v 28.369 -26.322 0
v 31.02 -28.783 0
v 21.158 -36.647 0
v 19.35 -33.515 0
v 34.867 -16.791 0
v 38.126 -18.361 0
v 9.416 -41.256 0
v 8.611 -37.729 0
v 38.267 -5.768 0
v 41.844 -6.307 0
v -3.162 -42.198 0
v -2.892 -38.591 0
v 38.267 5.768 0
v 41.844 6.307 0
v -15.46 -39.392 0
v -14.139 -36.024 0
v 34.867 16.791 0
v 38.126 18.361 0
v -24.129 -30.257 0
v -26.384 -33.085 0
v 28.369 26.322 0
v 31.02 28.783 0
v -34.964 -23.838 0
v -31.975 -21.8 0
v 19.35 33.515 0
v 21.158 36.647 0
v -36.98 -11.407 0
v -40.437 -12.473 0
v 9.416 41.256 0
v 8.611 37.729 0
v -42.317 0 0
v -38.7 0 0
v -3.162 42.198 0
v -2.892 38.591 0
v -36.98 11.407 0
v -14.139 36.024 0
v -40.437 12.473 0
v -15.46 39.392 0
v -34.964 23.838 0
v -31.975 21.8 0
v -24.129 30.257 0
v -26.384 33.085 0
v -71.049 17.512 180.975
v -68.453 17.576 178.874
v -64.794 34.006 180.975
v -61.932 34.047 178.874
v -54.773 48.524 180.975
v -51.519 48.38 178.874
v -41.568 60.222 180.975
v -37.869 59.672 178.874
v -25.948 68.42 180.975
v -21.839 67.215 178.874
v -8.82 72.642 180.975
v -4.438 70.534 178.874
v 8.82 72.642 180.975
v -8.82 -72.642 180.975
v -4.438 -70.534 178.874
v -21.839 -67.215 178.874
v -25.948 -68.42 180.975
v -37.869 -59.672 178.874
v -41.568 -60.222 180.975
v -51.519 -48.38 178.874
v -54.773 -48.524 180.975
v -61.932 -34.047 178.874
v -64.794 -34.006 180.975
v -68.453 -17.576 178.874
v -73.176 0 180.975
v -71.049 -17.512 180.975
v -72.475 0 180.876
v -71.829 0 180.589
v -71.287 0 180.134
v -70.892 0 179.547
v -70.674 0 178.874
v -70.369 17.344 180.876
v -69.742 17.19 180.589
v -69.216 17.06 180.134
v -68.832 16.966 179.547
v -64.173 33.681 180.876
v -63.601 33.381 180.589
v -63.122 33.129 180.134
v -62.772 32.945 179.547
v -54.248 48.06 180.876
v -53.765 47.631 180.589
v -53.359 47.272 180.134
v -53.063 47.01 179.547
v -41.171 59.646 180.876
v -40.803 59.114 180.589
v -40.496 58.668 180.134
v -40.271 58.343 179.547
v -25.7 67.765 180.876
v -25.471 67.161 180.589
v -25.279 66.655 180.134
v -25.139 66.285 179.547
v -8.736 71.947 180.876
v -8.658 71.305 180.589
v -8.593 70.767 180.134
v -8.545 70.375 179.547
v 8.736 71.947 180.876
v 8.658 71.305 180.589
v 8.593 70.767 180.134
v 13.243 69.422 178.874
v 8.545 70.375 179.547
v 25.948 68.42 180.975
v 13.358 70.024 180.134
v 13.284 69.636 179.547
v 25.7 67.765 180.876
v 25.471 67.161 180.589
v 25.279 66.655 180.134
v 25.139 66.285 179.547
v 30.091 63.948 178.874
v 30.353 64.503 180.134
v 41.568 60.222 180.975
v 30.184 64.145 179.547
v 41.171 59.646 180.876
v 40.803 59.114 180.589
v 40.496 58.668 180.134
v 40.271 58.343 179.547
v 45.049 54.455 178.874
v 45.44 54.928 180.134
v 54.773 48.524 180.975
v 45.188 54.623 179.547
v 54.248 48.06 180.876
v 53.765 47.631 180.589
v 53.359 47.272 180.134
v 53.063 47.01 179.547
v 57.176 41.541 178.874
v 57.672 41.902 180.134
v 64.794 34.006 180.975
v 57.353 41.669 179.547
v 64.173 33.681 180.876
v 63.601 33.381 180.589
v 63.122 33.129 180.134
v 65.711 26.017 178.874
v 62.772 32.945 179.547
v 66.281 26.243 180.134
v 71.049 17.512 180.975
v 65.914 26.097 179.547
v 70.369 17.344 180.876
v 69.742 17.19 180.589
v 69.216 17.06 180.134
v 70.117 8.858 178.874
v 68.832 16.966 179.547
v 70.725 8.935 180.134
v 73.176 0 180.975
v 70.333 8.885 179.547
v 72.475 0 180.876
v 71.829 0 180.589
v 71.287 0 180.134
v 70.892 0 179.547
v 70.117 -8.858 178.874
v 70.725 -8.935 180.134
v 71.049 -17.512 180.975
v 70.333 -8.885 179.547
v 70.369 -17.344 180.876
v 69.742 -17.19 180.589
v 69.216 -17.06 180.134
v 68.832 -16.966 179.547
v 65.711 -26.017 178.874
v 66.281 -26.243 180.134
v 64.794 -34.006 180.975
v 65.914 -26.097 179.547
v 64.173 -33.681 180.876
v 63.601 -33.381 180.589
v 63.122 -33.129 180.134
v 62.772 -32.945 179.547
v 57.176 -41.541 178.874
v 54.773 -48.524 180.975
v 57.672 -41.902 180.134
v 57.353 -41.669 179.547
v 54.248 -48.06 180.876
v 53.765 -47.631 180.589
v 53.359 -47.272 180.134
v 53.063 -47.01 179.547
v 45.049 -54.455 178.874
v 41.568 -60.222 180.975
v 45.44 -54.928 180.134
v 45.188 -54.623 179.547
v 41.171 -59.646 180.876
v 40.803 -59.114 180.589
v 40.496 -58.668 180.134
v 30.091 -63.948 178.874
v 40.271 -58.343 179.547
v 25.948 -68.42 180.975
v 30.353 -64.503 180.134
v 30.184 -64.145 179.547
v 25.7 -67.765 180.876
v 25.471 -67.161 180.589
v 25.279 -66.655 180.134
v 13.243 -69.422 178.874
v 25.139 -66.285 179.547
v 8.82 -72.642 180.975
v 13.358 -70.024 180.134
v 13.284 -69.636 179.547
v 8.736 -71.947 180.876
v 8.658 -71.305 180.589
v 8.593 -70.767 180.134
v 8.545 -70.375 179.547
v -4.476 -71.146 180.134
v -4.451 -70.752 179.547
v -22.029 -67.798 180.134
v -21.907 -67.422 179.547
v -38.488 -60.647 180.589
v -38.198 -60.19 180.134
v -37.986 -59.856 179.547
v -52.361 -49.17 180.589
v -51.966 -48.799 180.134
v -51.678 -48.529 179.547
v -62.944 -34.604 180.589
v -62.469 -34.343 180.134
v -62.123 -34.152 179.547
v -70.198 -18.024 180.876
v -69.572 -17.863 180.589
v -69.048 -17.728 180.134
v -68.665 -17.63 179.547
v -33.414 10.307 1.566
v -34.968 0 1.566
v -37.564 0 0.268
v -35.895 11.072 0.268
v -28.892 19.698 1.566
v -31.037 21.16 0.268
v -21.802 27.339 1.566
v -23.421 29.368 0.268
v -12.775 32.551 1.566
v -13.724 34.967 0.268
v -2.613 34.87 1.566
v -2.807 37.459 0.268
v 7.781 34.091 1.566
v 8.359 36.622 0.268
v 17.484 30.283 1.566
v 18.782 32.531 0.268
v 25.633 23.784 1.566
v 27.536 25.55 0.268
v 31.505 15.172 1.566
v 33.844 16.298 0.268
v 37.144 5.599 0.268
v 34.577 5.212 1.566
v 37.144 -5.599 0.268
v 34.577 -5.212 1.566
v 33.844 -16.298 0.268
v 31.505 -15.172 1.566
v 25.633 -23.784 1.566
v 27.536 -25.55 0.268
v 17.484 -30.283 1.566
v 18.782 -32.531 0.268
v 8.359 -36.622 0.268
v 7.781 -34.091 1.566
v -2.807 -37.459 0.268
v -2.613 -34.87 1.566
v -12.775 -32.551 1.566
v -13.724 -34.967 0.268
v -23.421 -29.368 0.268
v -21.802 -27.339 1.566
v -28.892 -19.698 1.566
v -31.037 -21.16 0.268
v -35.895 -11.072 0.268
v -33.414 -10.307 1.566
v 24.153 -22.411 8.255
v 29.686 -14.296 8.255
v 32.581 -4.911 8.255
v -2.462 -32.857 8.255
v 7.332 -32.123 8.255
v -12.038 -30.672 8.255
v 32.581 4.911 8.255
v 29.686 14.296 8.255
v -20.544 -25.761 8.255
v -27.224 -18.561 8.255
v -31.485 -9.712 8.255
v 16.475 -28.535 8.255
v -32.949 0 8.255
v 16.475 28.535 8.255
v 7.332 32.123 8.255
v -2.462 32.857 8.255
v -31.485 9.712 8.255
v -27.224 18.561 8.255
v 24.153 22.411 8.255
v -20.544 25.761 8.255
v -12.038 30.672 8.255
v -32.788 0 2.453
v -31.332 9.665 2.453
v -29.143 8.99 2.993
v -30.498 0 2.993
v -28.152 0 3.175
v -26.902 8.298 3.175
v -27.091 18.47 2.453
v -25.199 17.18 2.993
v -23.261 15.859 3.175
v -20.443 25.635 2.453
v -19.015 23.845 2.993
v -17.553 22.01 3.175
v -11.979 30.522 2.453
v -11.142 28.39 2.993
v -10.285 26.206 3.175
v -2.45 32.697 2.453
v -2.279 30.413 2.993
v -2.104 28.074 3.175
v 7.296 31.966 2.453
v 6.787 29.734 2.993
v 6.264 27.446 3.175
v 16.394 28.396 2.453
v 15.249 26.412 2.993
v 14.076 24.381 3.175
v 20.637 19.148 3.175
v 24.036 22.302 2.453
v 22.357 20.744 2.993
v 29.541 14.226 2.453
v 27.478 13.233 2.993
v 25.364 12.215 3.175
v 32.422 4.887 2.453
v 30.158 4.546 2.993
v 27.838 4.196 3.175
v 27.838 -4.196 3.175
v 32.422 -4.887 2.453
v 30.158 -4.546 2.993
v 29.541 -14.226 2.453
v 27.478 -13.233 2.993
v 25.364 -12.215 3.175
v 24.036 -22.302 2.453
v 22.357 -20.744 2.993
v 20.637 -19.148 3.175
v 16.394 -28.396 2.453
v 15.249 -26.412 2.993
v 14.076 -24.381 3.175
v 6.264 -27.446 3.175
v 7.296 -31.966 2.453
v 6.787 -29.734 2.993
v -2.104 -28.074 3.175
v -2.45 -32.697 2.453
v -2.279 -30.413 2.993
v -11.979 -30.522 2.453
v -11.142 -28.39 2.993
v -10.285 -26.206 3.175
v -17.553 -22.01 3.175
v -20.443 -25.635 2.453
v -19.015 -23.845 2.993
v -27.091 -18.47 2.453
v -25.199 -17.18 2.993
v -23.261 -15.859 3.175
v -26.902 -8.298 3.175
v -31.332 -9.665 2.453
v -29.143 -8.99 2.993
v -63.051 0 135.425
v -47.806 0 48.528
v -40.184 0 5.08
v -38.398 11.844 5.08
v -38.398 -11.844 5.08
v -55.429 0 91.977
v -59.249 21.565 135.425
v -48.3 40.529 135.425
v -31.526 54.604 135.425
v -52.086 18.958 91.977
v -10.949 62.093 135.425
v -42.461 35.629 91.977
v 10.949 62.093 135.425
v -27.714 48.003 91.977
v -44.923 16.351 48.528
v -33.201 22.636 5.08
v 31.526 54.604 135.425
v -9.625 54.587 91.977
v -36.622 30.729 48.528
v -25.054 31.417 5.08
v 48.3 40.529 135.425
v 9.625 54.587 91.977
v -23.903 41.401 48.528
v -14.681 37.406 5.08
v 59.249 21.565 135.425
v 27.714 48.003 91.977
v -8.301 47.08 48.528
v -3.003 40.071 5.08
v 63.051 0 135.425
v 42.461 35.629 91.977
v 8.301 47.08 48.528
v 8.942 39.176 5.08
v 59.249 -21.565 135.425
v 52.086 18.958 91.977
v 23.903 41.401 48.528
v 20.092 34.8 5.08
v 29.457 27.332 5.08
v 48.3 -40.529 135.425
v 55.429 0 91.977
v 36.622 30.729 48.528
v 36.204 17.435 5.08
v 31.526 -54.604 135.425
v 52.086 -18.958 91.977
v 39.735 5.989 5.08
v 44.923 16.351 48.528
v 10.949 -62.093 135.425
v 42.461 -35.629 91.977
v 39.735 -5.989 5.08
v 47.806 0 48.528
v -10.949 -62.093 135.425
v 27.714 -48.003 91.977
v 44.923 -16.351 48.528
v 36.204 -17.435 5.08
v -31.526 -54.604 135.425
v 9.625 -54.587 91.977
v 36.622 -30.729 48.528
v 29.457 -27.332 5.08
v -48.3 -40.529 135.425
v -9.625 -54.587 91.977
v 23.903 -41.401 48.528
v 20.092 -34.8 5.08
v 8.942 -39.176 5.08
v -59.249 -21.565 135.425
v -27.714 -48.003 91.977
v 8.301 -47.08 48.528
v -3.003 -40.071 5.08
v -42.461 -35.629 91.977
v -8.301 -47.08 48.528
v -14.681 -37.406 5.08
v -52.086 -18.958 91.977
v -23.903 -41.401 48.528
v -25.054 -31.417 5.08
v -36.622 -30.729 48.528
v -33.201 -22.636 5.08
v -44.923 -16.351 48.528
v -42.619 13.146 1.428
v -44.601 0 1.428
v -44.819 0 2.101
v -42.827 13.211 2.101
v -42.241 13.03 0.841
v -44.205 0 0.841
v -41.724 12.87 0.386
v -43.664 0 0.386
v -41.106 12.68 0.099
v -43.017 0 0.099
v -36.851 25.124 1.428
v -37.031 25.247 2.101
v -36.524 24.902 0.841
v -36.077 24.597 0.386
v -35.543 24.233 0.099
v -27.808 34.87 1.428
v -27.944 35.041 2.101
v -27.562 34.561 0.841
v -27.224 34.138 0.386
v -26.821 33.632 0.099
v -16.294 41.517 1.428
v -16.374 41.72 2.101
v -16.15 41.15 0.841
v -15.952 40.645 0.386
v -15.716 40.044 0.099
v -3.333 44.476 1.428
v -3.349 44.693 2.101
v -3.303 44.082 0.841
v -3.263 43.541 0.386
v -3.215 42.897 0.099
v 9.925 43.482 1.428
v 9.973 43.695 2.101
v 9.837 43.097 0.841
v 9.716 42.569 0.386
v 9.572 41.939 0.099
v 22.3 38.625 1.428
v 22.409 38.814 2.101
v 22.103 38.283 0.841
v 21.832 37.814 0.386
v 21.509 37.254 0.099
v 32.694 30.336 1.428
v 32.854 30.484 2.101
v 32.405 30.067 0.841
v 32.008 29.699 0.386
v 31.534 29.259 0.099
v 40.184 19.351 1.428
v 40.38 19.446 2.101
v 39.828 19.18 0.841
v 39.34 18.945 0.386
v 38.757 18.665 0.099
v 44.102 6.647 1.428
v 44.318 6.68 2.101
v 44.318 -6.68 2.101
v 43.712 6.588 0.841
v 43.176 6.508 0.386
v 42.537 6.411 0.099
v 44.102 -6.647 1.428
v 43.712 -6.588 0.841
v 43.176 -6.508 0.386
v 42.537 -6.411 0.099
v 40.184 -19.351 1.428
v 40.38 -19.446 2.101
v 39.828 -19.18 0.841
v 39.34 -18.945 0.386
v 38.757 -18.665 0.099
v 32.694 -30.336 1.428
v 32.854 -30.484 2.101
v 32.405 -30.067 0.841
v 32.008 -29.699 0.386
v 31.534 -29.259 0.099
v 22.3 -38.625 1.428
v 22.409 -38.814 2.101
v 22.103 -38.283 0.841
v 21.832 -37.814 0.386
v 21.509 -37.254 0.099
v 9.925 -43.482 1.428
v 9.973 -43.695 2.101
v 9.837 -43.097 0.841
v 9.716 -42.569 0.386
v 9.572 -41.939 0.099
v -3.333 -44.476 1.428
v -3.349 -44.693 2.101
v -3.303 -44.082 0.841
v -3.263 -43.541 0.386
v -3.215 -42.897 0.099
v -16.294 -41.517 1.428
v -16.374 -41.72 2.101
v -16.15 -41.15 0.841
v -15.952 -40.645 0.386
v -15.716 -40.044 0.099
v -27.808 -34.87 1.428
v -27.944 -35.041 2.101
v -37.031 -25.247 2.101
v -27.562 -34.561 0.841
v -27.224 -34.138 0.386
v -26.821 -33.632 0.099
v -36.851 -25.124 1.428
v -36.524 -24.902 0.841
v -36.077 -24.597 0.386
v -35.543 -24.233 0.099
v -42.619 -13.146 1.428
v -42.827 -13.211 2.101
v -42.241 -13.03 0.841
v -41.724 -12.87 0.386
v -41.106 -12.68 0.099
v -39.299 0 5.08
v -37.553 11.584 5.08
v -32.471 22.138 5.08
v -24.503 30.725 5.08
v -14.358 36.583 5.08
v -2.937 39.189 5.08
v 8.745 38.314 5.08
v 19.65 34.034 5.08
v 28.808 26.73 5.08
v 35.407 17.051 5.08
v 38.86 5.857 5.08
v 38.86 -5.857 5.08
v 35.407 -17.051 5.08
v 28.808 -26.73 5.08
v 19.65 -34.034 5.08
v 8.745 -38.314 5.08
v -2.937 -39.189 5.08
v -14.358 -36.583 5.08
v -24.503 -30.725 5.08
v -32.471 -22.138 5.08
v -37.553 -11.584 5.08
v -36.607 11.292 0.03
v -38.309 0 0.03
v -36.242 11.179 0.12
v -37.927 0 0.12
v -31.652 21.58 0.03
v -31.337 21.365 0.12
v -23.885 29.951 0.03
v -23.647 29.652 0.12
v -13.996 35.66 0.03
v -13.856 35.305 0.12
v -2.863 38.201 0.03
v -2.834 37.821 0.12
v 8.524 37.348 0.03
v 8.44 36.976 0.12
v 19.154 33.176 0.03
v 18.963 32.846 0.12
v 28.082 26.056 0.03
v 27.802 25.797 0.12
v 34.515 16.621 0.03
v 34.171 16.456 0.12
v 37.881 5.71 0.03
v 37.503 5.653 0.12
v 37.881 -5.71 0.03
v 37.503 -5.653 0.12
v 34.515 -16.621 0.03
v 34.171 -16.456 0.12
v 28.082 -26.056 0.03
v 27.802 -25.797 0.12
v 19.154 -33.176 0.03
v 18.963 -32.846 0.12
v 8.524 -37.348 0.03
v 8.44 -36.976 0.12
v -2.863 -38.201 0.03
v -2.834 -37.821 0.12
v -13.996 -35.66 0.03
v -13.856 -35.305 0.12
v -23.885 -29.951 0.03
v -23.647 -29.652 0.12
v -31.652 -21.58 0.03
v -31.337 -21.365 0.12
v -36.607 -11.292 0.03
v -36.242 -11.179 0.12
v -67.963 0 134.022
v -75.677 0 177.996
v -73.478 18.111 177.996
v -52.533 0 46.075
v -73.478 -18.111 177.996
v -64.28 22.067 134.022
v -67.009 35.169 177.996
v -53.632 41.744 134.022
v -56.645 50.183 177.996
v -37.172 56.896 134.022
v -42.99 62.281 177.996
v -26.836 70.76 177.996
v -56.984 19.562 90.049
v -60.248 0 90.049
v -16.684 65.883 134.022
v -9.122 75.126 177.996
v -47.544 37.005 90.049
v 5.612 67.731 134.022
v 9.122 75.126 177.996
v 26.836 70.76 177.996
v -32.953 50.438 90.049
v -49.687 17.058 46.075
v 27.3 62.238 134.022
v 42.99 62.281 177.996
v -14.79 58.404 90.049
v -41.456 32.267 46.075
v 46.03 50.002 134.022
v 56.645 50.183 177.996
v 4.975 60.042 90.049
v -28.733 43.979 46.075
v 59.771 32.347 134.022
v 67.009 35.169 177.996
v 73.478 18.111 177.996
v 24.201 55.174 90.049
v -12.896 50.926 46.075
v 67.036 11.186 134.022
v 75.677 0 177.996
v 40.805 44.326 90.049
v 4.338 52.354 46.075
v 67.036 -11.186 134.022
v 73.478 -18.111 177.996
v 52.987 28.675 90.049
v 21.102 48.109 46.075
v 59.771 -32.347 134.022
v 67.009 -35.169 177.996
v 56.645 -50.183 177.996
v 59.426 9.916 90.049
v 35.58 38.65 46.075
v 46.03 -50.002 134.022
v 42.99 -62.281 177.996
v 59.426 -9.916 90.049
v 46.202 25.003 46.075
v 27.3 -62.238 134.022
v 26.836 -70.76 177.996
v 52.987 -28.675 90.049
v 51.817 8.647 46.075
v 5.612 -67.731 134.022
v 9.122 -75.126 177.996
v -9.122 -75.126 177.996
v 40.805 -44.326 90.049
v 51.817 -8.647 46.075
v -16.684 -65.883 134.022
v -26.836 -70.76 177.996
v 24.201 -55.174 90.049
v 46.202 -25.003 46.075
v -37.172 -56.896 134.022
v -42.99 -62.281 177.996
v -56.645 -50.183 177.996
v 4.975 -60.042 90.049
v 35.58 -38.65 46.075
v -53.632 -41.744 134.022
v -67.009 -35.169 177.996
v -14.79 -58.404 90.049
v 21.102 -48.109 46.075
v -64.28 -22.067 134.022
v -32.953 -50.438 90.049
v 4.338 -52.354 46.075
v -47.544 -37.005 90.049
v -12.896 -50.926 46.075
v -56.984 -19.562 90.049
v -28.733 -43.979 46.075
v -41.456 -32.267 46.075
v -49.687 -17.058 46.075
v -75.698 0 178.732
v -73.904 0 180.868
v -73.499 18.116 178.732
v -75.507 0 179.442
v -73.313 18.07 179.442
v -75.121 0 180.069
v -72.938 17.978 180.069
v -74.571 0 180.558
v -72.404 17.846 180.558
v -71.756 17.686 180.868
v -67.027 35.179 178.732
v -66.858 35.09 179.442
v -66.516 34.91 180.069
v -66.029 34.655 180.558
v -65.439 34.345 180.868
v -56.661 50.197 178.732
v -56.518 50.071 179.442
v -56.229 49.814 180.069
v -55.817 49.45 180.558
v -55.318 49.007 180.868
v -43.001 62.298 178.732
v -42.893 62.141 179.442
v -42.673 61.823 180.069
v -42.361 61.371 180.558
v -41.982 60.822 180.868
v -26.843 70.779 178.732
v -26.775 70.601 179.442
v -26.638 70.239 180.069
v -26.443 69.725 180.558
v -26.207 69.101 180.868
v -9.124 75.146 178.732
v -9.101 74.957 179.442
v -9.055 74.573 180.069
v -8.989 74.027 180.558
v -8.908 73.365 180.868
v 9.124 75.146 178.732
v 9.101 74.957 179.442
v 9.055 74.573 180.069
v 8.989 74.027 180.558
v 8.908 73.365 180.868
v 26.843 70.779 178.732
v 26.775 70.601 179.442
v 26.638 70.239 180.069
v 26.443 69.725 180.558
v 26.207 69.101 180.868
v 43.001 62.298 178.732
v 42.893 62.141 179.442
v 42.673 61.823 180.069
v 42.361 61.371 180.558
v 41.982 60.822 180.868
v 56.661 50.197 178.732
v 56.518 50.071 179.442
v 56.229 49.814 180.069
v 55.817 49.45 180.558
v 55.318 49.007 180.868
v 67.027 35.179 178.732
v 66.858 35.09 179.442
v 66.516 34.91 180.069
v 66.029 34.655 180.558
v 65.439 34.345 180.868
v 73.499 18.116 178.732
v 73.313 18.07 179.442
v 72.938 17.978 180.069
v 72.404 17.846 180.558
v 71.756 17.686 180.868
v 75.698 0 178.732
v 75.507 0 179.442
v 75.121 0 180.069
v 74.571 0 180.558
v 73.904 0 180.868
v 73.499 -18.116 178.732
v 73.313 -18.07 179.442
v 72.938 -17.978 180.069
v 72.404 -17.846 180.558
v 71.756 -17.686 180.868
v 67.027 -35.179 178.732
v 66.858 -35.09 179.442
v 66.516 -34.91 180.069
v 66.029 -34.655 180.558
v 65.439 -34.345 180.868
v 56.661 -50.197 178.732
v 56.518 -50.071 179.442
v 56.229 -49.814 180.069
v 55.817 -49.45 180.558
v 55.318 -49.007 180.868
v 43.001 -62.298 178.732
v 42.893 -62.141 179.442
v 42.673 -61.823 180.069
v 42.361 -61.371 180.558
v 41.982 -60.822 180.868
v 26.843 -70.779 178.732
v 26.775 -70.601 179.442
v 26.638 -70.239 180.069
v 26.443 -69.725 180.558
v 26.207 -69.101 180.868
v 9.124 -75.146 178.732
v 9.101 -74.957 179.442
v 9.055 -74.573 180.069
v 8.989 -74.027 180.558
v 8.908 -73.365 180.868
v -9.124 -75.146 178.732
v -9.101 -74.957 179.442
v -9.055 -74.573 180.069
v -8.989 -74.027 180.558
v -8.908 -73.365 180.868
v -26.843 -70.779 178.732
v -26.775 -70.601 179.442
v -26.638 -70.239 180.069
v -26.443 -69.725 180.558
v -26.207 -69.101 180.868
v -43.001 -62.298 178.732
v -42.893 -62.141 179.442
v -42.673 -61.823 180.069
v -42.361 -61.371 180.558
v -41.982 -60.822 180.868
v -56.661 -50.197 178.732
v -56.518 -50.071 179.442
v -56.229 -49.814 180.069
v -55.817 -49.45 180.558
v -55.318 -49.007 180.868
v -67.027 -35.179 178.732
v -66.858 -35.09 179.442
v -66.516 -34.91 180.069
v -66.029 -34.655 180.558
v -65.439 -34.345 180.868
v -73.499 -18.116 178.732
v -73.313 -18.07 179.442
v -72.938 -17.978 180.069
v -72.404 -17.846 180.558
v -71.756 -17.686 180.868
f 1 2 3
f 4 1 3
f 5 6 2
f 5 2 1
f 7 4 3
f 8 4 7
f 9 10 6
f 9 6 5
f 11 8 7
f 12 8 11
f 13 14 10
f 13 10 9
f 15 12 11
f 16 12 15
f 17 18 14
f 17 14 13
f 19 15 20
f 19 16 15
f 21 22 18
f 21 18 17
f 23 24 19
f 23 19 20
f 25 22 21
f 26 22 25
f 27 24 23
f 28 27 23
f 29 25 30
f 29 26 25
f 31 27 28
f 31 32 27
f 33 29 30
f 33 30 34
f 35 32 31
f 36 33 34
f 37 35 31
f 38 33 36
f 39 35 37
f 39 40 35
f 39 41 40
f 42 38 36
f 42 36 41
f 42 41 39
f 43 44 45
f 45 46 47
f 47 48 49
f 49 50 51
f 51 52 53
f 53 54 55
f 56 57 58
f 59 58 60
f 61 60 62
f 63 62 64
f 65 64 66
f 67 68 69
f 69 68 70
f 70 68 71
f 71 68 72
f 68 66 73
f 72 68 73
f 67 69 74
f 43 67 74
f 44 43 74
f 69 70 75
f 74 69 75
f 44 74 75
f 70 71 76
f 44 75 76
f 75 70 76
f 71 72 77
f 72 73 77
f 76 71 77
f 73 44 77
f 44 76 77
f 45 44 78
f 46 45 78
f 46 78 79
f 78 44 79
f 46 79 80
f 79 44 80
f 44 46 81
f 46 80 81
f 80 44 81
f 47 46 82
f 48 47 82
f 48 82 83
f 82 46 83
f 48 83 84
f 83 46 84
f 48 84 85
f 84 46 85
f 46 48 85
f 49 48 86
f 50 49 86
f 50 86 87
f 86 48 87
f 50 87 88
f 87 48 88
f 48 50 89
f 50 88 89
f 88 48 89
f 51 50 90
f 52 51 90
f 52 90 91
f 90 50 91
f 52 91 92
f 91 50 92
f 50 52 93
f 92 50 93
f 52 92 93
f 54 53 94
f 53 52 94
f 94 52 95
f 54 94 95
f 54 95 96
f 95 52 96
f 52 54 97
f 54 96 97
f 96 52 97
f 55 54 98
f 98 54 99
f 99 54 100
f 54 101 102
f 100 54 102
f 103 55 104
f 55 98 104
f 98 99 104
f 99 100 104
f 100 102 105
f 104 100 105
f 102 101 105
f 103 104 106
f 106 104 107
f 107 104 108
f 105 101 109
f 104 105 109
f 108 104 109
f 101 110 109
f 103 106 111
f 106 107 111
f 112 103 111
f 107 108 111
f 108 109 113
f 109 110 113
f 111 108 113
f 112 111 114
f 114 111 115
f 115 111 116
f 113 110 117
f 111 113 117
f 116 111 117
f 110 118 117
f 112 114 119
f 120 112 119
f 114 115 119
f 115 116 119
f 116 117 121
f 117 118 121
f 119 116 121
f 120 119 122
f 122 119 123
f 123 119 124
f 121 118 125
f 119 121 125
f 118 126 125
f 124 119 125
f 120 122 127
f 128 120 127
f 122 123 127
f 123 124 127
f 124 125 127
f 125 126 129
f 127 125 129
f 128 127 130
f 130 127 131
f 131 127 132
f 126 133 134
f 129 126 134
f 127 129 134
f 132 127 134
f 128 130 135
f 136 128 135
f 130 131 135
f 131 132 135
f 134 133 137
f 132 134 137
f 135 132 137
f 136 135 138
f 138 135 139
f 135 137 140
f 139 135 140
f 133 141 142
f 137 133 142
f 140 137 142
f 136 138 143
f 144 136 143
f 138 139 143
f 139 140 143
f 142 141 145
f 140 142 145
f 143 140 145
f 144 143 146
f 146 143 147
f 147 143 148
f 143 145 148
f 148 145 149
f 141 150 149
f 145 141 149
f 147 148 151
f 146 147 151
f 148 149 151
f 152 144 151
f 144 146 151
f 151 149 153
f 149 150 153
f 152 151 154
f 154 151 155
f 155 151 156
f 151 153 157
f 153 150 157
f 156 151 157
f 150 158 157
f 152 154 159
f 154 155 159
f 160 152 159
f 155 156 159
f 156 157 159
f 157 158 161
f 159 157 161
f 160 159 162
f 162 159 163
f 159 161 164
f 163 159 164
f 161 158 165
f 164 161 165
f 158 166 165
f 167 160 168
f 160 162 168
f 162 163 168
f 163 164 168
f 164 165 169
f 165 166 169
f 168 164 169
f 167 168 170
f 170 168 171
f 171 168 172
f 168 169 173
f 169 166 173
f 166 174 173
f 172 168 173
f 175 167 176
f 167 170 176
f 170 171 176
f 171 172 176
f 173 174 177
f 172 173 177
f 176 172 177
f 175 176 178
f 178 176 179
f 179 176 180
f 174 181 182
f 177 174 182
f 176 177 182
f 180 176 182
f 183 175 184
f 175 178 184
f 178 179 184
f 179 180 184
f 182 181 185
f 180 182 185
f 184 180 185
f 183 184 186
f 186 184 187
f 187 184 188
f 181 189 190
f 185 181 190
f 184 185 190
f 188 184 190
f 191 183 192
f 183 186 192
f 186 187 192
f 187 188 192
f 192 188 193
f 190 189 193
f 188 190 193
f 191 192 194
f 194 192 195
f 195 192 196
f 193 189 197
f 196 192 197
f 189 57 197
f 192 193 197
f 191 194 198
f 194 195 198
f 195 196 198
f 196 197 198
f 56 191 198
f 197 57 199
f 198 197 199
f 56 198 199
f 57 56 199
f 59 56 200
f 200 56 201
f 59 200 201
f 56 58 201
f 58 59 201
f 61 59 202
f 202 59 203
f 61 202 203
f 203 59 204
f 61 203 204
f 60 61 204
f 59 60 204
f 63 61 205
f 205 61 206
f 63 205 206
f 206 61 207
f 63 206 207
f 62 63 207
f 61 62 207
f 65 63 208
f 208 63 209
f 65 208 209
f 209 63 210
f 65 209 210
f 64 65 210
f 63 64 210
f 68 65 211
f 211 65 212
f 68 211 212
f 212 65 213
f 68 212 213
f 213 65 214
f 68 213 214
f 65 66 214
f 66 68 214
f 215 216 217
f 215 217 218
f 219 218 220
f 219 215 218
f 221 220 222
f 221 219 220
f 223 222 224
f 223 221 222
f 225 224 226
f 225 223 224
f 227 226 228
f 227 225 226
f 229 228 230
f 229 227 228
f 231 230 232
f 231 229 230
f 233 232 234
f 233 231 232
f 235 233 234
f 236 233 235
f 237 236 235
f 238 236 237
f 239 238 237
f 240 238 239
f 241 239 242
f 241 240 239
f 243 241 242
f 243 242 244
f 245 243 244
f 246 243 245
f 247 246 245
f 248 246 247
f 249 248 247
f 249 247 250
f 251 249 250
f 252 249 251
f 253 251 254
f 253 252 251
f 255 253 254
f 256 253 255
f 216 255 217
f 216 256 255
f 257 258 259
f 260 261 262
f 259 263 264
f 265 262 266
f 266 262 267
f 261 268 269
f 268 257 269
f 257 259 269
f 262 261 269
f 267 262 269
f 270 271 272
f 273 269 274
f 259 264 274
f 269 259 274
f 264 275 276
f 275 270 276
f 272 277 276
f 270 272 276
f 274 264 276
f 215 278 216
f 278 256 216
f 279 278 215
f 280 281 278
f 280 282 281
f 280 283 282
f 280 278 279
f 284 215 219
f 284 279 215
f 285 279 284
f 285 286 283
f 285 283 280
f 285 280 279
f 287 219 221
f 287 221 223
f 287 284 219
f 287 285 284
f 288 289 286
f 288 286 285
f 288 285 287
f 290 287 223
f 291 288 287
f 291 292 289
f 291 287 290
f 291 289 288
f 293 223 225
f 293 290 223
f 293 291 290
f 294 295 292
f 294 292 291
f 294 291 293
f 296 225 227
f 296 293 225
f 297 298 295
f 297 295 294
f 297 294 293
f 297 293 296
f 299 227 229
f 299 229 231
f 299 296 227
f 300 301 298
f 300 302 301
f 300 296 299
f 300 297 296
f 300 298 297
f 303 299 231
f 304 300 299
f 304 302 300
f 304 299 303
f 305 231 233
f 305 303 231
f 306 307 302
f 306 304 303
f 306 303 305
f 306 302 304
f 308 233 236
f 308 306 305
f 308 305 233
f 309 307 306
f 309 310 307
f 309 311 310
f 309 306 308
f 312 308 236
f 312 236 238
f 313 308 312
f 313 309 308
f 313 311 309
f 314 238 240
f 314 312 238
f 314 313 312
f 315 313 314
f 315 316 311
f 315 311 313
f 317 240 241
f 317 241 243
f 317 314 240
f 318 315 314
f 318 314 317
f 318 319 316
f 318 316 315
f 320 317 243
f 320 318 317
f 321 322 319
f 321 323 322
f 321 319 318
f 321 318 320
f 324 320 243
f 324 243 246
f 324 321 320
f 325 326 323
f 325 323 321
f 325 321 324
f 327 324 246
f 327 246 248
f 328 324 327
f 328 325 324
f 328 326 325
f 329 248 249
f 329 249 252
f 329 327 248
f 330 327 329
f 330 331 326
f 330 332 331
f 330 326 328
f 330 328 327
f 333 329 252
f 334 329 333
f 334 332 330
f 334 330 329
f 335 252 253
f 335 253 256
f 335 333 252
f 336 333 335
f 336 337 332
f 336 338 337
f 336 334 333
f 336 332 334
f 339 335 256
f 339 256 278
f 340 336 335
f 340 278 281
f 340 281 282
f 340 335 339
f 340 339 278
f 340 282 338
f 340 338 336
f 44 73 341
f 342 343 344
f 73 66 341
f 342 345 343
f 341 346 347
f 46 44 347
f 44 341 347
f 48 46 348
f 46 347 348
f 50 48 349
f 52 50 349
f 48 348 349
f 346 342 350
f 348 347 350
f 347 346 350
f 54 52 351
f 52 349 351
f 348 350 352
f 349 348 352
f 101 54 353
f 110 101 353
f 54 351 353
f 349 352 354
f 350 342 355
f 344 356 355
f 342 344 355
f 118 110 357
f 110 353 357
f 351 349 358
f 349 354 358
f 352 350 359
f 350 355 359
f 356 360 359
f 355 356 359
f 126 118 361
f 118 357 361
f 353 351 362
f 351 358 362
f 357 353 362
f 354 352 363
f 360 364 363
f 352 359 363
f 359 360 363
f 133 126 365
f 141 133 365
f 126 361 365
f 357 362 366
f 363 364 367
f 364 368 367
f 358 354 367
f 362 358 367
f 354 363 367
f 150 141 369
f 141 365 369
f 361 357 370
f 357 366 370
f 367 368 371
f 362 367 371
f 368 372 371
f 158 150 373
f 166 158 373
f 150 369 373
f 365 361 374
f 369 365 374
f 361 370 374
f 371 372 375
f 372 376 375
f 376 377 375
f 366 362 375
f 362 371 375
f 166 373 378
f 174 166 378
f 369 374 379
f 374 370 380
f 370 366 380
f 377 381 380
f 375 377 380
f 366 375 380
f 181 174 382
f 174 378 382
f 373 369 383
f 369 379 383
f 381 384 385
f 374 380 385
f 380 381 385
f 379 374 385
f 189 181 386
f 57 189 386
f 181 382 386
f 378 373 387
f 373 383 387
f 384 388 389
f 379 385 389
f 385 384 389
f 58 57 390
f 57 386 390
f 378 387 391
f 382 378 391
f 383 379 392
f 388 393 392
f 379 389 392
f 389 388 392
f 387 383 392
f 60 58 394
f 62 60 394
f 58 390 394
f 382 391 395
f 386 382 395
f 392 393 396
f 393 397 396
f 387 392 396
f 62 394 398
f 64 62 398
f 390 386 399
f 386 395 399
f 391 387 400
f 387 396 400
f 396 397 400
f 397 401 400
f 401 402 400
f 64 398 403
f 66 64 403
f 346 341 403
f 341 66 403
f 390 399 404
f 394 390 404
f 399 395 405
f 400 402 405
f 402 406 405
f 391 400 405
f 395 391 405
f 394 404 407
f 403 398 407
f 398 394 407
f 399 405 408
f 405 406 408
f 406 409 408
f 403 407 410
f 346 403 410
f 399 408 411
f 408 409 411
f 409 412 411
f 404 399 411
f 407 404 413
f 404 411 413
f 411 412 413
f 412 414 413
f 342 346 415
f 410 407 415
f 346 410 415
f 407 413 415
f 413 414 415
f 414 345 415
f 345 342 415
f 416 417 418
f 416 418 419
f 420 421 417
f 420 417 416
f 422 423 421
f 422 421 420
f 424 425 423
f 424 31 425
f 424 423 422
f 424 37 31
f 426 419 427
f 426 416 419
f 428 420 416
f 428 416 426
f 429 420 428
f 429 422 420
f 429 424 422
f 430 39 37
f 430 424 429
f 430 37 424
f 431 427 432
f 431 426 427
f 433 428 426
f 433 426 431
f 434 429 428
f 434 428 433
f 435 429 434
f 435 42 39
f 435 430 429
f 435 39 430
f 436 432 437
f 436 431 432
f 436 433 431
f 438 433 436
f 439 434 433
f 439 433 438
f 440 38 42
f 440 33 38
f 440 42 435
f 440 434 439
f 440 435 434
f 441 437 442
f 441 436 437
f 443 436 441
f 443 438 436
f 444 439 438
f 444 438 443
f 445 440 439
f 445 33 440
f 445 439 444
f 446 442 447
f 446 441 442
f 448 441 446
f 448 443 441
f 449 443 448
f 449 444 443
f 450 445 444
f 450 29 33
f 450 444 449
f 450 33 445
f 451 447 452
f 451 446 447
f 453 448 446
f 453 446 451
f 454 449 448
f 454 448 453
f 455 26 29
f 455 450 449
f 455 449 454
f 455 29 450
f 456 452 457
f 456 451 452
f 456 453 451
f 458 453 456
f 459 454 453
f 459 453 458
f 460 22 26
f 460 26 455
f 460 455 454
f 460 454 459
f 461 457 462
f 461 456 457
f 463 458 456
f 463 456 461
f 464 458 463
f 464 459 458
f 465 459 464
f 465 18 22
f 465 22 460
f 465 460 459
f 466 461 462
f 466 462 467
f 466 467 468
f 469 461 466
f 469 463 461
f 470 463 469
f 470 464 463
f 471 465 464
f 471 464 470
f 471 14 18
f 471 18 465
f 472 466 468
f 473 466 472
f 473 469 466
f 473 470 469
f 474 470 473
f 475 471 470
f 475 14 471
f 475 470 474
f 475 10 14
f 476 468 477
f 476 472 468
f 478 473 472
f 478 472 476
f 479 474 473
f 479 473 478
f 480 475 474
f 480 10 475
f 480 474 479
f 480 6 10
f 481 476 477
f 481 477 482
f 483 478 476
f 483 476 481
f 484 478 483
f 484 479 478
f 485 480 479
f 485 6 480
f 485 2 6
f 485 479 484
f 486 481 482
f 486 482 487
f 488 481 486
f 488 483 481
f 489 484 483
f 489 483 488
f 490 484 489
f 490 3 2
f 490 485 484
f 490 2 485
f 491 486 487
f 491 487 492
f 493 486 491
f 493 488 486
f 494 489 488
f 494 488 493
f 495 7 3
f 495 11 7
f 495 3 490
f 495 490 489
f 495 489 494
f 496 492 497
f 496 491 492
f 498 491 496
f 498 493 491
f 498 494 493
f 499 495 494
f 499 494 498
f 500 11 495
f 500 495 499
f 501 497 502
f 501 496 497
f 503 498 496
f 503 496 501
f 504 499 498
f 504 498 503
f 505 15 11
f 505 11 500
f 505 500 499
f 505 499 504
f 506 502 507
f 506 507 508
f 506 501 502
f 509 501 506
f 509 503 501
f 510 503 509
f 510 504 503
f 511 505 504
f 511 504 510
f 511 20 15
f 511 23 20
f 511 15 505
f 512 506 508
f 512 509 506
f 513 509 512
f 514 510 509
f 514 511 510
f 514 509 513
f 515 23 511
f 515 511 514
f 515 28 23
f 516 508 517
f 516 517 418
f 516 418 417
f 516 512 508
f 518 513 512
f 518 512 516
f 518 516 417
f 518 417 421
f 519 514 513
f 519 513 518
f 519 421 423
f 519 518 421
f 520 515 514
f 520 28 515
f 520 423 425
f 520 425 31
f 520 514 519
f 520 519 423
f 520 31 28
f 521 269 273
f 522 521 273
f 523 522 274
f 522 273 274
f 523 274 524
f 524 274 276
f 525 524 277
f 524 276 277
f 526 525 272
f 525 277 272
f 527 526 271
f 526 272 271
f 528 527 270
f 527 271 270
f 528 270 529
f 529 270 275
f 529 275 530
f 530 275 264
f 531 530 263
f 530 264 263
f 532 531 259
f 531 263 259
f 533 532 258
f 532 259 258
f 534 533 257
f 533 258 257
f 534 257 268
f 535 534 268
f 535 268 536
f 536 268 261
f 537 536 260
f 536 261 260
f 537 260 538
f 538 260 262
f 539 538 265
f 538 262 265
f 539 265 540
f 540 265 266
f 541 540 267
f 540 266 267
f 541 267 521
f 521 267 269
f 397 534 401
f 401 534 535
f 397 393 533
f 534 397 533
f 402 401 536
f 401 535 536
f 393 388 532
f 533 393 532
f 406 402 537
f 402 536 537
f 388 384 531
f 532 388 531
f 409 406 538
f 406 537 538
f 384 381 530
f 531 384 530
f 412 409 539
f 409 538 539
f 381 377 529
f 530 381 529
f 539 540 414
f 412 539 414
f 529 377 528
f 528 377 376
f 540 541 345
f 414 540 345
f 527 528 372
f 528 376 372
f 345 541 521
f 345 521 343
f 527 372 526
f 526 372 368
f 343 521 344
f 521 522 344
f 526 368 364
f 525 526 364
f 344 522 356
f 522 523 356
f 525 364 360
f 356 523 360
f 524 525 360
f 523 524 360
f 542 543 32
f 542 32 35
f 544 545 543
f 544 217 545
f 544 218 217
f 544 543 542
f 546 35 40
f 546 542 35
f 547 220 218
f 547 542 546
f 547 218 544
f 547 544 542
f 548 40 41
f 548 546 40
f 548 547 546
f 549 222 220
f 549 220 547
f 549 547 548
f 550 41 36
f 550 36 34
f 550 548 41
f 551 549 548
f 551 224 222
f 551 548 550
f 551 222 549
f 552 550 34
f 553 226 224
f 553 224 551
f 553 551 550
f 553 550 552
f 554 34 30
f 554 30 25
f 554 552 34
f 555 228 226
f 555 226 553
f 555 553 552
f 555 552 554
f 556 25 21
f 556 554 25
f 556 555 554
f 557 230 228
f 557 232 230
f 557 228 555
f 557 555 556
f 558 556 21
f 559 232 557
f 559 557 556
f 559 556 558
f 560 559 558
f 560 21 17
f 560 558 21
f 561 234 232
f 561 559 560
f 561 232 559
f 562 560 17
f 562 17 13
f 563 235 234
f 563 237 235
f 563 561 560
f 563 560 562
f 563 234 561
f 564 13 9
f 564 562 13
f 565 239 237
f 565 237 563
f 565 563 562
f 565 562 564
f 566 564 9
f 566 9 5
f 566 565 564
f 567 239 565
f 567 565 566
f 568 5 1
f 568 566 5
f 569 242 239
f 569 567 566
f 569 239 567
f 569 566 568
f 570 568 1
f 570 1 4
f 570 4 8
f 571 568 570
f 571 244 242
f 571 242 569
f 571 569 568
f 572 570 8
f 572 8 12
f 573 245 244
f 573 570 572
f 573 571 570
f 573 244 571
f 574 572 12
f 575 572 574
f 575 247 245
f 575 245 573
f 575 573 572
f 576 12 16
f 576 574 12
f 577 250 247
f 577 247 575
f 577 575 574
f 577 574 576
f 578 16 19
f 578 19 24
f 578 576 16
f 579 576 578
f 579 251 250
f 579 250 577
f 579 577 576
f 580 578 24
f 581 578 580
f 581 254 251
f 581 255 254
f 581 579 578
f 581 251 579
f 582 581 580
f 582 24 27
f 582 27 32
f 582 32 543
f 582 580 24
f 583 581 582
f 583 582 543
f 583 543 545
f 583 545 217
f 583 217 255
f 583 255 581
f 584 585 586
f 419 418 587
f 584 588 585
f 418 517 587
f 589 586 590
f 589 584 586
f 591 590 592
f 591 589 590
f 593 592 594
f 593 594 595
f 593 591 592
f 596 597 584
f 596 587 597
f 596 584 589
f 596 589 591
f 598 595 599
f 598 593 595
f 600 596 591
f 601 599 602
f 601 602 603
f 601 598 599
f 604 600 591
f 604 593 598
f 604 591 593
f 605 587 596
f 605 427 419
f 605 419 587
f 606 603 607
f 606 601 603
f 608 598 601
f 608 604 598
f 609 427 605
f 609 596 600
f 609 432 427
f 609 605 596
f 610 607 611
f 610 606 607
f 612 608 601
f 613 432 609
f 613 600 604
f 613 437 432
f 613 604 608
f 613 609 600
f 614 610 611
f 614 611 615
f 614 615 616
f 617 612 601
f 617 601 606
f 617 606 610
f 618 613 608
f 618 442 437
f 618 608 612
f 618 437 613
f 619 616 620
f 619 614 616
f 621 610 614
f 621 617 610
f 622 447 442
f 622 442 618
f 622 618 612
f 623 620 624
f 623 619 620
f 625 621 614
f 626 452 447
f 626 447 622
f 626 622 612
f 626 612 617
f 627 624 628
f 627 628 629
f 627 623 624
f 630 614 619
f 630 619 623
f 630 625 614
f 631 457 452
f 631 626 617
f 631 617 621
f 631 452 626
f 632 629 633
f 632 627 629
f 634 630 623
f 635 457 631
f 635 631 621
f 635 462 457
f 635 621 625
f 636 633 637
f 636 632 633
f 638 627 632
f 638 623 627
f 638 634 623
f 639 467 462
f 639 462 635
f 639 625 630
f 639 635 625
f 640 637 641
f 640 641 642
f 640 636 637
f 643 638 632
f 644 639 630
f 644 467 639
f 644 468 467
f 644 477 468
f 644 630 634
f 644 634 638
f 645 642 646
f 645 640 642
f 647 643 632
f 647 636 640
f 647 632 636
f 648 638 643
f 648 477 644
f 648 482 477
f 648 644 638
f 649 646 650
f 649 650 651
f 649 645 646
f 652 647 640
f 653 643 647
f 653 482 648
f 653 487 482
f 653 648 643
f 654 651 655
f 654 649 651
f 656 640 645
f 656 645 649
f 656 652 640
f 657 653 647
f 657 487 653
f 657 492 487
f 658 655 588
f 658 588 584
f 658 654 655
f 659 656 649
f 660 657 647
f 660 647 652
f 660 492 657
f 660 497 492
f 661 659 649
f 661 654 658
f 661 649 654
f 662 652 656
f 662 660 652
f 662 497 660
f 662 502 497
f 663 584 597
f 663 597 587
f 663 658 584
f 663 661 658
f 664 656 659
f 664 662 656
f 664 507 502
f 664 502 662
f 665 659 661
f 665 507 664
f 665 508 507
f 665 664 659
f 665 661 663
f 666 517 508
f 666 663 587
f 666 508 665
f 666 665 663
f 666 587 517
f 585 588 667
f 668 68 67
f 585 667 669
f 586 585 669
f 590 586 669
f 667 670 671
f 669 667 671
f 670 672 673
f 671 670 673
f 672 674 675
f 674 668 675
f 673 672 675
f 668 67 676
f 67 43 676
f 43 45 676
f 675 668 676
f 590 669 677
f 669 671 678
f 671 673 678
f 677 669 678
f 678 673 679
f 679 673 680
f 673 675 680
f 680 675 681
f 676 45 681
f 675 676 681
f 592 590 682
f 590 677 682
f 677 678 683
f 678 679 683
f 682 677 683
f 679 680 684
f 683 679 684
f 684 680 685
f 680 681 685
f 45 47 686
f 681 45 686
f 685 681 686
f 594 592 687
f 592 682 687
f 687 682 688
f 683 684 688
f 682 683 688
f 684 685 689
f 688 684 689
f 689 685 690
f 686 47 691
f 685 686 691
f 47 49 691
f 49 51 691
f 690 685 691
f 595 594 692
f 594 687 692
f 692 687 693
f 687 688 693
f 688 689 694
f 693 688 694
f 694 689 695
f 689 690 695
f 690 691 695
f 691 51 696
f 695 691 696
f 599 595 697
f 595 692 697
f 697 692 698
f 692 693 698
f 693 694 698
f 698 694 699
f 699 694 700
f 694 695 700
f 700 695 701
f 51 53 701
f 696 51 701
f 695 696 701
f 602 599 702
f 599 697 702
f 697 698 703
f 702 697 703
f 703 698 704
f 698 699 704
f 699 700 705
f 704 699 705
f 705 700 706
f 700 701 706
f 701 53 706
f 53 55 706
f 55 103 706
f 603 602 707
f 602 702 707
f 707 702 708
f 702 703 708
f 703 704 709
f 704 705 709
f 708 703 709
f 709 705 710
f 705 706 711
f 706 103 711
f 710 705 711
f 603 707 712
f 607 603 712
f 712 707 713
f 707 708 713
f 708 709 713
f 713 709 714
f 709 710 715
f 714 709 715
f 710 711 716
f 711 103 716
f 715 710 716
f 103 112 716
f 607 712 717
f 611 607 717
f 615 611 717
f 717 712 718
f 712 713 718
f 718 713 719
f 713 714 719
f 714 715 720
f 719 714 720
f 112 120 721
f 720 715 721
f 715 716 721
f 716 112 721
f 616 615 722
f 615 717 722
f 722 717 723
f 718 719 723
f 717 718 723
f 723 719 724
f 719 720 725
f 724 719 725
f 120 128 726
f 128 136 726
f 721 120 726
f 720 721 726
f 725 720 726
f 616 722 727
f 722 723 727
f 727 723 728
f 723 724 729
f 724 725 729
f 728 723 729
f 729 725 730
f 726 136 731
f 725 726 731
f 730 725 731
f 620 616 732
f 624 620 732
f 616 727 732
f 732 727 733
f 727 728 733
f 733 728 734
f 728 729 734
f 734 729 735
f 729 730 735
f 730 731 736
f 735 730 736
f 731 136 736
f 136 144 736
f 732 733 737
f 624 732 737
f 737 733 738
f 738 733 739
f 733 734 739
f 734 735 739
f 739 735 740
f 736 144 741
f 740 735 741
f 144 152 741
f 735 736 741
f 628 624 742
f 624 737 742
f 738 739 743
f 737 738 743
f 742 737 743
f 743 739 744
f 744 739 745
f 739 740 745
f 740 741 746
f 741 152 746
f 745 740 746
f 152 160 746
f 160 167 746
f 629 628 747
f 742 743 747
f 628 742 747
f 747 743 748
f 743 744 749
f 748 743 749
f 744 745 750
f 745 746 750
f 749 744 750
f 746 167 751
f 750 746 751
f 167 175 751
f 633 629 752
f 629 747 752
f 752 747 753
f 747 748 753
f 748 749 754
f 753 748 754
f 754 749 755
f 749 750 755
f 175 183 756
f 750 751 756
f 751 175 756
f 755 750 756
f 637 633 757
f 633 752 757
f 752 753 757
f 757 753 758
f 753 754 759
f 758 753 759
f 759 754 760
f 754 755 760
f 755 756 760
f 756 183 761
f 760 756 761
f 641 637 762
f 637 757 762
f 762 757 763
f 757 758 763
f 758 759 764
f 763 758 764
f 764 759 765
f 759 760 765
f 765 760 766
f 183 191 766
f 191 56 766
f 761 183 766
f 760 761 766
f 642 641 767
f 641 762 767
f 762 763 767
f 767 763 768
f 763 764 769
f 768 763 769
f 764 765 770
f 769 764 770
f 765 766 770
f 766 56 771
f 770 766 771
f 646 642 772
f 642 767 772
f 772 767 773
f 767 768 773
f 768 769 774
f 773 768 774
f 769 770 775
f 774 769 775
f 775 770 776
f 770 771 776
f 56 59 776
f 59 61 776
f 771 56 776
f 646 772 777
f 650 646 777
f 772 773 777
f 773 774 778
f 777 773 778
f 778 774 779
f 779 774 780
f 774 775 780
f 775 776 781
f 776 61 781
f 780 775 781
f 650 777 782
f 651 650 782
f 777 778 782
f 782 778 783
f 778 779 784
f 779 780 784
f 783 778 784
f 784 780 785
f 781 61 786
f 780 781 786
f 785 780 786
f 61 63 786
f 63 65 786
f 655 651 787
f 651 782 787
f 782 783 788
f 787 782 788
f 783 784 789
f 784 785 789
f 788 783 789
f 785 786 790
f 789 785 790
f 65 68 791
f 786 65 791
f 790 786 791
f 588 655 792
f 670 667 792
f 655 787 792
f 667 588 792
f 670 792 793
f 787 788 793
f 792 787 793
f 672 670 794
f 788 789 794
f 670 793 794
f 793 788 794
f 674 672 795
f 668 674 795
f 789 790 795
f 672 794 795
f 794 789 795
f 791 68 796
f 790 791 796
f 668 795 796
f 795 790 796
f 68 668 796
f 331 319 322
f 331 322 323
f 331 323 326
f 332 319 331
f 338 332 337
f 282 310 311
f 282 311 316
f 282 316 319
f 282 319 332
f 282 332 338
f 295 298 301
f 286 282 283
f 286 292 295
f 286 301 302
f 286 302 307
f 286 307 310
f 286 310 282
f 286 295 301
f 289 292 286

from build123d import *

# Parameters (mm, degrees)
F2_T = -5.08
F3_R = 2.53999
F4_R = 2.54
F5_R = 15.24


# Not quite as in the source:
# - a fillet or chamfer is up to 0.001 mm smaller than in the source, because OpenCascade refuses the exact size


with BuildPart() as f1:
    # F0 (on Front) → F1 (revolve)
    with BuildSketch(Plane.XZ):
        Polygon((-31.75, 3.175), (0, 3.175), (0, 180.975), (-76.2, 180.975), (-44.45, 0), (-38.1, 0), align=None)
    revolve(axis=Axis((0, 0, 92.075), (0, 0, -1)))

    # F2
    f2_openings = [f1.faces().sort_by_distance(p)[0] for p in [
        (0, 0, 180.975),
    ]]
    offset(amount=F2_T, openings=f2_openings, kind=Kind.INTERSECTION)

    # F3 (radius 2.54 in the source; OpenCascade refuses exactly that, so slightly less here)
    f3_edges = [f1.edges().sort_by_distance(p)[0] for p in [
        (76.2, 0, 180.975),
        (71.042415, 0, 180.975),
    ]]
    fillet(f3_edges, radius=F3_R)

    # F4
    f4_edges = [f1.edges().sort_by_distance(p)[0] for p in [
        (44.45, 0, 0),
        (38.1, 0, 0),
    ]]
    fillet(f4_edges, radius=F4_R)

    # F5
    f5_edges = [f1.edges().sort_by_distance(p)[0] for p in [
        (31.75, 0, 3.175),
    ]]
    fillet(f5_edges, radius=F5_R)


solid = f1.part
